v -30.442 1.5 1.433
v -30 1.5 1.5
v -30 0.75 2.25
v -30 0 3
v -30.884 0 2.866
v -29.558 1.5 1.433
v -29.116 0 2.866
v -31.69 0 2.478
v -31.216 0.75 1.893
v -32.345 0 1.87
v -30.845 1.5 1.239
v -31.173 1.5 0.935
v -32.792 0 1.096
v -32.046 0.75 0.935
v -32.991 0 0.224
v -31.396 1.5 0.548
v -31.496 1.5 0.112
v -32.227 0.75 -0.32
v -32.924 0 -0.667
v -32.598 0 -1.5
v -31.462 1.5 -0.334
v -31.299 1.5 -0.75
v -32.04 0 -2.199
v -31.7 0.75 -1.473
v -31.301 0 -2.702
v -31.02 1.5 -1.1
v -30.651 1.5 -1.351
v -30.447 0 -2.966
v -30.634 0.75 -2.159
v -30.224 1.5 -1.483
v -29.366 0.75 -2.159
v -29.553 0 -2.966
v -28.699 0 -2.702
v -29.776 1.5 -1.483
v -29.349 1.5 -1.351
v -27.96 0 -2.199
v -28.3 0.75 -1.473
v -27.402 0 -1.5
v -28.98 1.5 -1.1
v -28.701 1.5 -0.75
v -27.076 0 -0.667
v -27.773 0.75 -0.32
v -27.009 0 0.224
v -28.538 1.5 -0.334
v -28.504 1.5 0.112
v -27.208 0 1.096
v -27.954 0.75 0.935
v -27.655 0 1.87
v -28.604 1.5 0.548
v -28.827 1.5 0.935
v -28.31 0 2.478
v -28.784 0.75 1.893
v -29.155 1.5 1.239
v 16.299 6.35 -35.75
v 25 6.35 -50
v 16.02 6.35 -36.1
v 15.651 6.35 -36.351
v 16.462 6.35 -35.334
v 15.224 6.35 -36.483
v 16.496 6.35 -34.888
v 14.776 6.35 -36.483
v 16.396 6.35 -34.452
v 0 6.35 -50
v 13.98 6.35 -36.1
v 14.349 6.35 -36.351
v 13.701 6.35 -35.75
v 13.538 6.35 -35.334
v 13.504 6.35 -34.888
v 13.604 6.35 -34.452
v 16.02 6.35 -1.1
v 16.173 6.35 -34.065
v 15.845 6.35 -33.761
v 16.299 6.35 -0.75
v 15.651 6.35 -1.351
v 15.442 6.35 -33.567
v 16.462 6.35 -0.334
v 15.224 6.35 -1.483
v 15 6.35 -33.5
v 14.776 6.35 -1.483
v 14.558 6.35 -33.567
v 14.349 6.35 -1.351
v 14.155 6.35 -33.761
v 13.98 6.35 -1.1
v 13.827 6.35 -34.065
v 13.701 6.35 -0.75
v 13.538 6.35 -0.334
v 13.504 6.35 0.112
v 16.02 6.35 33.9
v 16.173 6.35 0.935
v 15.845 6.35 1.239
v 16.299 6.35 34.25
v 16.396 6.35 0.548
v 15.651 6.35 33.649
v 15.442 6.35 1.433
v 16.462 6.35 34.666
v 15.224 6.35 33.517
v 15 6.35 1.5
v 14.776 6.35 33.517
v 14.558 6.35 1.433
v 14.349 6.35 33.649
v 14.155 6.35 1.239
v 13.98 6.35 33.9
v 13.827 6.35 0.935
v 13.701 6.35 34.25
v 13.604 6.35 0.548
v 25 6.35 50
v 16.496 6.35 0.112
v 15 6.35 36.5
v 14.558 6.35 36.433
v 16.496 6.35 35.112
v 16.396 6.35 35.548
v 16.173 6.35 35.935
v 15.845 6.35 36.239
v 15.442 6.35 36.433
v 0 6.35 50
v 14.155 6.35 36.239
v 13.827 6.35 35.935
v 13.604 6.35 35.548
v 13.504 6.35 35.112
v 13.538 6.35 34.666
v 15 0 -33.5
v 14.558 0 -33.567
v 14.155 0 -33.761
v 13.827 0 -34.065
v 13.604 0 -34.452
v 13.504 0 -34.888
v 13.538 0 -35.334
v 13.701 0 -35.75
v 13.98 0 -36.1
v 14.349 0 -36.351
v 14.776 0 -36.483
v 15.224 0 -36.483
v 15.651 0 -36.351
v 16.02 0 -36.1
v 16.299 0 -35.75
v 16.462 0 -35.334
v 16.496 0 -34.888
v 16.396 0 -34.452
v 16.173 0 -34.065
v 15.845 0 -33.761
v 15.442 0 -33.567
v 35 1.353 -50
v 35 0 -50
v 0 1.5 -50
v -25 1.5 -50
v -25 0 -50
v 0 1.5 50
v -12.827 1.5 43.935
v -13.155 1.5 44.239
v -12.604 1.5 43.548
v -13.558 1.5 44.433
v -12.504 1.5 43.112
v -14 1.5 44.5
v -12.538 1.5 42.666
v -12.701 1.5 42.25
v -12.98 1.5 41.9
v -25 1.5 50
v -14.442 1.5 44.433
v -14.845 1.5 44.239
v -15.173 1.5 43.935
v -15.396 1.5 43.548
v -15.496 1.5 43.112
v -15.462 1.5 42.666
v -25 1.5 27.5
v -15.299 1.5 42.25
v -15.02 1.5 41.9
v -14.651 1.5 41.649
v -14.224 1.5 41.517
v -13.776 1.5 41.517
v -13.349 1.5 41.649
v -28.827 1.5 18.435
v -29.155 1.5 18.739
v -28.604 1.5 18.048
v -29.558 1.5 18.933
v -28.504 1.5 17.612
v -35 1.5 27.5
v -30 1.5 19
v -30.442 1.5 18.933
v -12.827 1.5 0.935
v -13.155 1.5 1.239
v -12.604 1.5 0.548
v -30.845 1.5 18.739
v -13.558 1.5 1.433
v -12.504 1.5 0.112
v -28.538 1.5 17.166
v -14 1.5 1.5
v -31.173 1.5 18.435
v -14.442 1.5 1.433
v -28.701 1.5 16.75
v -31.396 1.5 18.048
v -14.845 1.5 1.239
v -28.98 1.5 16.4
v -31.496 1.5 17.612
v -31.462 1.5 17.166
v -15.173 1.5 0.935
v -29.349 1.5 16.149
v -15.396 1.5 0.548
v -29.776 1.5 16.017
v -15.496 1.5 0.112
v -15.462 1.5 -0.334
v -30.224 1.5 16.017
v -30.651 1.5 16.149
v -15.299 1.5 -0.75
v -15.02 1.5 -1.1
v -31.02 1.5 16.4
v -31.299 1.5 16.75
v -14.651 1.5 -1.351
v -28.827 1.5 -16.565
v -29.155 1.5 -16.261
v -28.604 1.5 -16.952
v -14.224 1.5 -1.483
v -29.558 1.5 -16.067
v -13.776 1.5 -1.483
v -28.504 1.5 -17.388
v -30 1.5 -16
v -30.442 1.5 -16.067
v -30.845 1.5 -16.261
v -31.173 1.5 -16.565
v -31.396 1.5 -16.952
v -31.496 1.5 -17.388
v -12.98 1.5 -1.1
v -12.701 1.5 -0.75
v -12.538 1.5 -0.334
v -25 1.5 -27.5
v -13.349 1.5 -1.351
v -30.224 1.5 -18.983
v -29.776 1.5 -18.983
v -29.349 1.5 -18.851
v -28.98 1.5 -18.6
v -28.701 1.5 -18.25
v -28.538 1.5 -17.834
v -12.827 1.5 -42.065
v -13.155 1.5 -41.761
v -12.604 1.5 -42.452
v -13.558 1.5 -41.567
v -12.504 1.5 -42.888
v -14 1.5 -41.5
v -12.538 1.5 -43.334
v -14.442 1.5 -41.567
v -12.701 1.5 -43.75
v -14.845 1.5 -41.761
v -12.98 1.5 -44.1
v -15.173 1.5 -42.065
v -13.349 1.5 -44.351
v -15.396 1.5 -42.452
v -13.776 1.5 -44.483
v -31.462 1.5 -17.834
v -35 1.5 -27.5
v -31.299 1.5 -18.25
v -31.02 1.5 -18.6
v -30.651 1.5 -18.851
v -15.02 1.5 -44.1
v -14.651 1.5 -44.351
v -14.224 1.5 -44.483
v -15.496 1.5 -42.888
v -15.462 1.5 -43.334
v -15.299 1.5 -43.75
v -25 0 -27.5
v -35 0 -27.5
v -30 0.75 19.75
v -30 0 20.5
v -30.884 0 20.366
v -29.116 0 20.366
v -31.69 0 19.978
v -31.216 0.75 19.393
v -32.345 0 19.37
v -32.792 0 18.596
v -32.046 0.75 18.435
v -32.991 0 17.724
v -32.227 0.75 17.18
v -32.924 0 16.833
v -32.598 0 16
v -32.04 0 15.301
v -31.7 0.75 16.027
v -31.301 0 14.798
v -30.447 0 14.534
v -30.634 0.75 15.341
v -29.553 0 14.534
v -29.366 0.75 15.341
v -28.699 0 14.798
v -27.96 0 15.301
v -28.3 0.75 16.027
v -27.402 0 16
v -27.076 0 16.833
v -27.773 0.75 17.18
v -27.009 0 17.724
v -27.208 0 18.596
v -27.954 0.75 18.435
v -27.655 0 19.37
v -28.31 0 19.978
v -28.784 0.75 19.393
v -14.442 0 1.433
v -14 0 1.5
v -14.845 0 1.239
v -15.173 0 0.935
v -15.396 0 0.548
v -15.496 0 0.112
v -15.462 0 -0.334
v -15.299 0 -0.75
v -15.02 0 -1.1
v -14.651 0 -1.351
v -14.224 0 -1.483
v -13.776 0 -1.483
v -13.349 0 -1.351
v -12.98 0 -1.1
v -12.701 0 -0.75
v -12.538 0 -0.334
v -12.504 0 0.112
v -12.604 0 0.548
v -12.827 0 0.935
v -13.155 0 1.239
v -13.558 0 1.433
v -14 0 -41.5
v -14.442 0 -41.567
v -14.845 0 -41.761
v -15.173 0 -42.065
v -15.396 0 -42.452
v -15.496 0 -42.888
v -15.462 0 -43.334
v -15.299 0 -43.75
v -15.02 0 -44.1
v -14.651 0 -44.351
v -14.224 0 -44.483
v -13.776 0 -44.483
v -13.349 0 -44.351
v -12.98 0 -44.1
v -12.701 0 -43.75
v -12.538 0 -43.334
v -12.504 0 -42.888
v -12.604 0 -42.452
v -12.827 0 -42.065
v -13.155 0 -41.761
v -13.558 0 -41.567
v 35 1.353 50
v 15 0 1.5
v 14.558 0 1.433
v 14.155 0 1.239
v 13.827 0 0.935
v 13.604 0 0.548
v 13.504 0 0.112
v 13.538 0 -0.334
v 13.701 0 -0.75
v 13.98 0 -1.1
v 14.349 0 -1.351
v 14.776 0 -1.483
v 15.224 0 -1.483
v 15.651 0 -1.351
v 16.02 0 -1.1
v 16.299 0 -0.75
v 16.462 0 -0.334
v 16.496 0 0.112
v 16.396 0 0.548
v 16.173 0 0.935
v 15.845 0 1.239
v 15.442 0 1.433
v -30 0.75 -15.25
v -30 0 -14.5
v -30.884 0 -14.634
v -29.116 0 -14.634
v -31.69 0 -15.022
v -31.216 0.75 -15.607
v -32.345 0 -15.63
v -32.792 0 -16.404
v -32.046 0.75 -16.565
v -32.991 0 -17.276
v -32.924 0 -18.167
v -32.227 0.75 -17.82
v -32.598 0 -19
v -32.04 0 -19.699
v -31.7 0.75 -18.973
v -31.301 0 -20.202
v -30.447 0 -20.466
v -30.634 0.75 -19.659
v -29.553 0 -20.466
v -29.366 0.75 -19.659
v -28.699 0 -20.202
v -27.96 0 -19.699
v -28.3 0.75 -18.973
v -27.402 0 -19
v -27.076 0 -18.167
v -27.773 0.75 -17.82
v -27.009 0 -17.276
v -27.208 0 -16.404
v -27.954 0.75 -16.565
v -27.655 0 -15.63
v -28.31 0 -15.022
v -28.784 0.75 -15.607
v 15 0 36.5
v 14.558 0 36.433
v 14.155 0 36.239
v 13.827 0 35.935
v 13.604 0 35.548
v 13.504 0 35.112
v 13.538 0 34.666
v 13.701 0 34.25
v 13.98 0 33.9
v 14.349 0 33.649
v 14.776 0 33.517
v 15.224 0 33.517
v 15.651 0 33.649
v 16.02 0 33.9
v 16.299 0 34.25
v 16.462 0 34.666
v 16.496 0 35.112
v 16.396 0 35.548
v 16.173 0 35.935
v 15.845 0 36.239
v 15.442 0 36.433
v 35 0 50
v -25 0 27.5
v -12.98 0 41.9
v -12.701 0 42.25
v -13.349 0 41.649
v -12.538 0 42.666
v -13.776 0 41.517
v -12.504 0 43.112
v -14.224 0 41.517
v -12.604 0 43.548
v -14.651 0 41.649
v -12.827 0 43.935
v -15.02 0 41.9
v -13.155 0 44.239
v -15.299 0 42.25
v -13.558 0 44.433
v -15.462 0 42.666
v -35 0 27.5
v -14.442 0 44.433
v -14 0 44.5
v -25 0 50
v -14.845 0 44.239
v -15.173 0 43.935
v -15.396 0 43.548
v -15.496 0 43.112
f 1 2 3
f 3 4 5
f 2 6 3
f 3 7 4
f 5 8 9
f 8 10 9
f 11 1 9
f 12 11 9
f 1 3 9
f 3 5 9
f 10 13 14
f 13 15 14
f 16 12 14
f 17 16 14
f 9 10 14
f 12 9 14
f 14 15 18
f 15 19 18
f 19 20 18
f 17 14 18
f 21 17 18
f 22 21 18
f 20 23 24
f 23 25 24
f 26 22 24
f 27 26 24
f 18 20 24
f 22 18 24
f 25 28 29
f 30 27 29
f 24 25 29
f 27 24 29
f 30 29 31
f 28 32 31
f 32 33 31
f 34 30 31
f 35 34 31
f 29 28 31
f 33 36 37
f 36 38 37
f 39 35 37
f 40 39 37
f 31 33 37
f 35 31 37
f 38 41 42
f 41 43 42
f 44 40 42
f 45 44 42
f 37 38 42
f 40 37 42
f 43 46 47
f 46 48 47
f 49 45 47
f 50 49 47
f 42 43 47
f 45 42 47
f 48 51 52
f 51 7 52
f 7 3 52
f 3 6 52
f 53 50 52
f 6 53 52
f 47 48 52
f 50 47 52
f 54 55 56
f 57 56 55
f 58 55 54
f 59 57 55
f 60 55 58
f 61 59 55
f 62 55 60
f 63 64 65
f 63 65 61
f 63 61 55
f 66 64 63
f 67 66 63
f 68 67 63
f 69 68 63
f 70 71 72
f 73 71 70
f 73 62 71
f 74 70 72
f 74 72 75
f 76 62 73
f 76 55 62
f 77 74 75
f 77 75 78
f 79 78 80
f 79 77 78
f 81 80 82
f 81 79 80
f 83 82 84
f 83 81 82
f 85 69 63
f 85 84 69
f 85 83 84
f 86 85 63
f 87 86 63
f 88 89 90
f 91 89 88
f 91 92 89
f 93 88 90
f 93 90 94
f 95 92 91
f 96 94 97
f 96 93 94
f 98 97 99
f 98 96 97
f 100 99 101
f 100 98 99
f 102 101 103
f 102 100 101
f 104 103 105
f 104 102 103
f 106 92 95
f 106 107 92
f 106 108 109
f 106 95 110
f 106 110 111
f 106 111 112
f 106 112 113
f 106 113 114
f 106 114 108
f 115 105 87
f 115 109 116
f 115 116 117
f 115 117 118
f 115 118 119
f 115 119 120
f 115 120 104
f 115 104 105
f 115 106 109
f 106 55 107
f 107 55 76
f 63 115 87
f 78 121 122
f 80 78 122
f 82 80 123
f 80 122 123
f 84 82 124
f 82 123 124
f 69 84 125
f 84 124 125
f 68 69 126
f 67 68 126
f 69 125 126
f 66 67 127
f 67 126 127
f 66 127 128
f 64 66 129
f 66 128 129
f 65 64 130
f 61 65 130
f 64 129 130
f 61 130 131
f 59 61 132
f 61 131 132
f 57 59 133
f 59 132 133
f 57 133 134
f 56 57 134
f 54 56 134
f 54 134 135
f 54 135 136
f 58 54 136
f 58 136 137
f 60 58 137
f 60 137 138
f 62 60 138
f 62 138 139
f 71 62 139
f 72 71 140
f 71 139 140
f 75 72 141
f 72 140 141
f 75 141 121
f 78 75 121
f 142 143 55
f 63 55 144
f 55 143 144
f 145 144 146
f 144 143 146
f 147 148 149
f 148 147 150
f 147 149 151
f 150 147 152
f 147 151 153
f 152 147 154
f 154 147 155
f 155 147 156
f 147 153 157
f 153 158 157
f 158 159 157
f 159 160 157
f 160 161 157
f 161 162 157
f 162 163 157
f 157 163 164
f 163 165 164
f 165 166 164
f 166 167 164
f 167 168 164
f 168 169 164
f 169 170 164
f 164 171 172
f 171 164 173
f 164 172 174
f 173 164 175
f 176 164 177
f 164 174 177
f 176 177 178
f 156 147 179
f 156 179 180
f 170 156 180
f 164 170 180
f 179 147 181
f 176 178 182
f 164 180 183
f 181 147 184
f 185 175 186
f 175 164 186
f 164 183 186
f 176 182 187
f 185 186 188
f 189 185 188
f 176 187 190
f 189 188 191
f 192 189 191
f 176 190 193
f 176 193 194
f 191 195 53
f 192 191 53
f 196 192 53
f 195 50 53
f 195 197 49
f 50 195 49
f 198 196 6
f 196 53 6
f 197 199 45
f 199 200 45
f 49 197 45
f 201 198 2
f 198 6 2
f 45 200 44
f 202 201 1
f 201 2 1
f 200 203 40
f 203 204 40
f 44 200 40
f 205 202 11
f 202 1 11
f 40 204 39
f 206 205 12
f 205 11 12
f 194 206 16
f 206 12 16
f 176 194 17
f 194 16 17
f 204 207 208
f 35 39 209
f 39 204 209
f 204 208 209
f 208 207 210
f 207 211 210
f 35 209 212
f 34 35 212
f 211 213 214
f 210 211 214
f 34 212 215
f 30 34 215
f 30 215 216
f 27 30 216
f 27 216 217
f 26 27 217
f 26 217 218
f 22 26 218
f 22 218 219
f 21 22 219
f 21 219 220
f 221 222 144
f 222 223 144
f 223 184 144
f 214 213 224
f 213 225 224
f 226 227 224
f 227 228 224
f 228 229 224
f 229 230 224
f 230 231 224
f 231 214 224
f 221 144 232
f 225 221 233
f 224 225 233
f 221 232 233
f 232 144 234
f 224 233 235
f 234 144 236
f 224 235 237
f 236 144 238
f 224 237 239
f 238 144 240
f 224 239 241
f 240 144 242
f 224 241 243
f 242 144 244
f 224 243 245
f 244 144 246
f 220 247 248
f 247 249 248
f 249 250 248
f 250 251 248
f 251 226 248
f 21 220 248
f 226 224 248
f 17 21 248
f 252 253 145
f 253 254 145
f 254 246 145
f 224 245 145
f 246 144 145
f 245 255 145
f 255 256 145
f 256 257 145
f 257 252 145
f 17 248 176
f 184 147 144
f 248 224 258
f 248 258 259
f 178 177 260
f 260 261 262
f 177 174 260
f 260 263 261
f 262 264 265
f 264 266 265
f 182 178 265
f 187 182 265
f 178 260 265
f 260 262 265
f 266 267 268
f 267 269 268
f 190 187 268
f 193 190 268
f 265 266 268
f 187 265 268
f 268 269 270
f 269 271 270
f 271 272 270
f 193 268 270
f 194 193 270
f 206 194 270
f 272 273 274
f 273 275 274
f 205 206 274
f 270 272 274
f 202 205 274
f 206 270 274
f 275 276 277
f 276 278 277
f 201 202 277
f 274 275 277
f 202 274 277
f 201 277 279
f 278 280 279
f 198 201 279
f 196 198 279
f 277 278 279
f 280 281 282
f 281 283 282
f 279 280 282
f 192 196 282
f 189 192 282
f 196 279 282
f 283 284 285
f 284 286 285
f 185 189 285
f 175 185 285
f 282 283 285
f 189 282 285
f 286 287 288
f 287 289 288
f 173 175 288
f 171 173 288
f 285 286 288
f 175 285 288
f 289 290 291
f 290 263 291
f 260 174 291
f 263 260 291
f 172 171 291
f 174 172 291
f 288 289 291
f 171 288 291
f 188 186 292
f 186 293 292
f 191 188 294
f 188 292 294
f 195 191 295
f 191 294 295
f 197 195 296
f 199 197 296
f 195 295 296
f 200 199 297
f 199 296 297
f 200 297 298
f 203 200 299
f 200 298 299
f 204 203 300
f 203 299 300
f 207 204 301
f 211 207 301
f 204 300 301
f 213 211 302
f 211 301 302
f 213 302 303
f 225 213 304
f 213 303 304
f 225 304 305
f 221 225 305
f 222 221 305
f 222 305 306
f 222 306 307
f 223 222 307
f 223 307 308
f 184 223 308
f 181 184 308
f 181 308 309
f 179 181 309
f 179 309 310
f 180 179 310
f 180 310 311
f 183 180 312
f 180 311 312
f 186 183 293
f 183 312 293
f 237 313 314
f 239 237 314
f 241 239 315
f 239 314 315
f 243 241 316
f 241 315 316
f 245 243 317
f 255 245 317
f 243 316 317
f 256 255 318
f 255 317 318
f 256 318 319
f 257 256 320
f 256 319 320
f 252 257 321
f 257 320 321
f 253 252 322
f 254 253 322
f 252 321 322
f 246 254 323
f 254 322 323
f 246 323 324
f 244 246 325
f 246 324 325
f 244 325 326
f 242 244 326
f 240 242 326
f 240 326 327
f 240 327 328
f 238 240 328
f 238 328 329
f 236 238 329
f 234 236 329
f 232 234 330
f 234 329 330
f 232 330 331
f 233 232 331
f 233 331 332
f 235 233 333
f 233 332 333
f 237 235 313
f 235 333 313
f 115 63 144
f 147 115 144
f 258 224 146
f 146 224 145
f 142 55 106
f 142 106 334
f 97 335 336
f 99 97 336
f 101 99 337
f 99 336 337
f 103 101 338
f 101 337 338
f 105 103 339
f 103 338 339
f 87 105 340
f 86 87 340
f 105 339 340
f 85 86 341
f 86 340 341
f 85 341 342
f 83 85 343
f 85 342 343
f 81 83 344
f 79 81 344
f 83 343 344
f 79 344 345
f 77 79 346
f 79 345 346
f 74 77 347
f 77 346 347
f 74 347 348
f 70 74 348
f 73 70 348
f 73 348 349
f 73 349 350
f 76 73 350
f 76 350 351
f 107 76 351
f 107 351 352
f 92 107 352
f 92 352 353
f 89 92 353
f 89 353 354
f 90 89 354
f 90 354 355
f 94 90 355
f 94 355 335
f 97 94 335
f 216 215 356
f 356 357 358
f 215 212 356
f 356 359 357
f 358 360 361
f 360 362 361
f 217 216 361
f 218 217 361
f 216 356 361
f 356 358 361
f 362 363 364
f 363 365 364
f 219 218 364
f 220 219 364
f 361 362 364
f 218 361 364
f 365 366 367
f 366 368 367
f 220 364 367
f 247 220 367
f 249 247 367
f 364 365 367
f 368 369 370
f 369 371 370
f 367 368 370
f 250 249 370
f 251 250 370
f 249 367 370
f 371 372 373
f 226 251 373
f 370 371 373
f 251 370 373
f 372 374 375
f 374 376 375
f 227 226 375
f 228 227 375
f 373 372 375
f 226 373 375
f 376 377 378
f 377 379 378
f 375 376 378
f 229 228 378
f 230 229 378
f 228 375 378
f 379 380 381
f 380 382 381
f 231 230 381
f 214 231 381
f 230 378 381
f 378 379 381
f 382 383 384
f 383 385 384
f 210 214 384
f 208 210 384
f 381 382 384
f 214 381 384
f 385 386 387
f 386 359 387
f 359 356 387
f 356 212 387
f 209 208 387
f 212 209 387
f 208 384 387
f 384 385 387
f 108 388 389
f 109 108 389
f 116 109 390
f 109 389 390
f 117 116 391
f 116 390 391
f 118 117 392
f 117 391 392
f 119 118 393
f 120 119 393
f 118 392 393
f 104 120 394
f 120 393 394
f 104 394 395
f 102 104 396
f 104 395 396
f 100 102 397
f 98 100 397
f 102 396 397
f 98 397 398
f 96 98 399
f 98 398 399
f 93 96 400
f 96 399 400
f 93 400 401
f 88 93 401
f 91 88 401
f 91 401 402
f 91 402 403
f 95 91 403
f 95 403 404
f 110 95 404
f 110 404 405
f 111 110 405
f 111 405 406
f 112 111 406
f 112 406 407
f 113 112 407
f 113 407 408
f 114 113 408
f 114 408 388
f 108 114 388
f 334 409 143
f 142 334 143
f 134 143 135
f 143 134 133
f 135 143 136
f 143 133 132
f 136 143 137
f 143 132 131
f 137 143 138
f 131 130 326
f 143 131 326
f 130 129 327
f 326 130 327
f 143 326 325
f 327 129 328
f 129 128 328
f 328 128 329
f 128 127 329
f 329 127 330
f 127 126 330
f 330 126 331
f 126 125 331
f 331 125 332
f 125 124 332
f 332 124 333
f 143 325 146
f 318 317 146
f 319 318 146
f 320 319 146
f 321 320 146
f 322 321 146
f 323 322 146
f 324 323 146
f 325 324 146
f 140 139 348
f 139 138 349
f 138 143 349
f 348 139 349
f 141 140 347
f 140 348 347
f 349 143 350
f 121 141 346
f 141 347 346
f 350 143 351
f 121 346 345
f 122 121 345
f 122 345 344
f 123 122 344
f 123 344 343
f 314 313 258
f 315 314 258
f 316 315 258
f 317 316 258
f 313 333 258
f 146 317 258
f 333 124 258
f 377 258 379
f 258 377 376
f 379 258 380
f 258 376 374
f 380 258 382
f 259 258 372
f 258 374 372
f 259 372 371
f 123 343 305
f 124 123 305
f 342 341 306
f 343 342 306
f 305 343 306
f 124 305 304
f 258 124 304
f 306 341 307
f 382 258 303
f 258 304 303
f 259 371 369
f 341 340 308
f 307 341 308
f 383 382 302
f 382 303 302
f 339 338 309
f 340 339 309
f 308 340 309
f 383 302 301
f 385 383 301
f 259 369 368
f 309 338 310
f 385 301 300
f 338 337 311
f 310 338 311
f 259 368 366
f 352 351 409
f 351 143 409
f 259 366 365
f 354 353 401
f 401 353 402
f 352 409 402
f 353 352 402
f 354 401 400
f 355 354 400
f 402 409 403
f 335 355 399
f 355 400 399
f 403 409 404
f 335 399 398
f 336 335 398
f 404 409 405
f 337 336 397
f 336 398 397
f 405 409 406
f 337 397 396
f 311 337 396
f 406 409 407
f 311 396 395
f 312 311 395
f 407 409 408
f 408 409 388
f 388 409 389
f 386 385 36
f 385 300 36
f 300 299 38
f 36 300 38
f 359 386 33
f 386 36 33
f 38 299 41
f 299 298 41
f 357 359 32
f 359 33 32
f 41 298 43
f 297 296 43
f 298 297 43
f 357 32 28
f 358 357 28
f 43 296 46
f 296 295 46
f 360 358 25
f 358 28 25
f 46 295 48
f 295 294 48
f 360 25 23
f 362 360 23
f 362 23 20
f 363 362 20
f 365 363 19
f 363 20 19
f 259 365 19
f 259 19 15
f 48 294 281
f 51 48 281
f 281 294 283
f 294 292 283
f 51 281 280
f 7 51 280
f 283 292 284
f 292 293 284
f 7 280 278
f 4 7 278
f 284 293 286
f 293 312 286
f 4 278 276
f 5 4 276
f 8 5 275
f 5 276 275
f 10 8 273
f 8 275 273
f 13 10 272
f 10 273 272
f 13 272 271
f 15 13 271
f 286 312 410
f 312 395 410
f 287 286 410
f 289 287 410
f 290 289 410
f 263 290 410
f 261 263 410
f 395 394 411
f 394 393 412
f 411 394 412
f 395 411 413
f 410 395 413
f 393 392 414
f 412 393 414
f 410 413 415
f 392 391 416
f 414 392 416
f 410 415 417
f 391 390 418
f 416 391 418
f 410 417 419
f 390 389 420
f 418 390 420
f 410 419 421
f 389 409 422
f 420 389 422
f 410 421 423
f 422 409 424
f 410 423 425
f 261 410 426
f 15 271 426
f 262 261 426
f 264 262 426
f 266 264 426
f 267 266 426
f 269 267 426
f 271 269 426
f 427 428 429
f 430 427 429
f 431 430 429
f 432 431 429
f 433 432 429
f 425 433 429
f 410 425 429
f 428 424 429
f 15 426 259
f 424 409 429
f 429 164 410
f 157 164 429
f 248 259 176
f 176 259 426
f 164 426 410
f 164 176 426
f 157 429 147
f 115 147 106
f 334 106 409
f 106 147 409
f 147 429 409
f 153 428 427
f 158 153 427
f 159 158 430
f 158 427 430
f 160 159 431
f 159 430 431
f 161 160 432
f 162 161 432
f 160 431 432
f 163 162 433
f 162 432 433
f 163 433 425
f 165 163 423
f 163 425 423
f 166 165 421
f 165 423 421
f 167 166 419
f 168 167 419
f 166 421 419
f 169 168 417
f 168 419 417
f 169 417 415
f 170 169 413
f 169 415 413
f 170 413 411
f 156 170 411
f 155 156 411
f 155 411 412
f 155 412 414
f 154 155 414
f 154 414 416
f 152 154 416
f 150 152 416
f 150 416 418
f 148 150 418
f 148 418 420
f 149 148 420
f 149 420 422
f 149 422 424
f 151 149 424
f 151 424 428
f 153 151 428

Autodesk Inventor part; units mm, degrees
ref_plane "YZ Plane" through (0, 0, 0) normal (1, 0, 0) x (0, 1, 0)
ref_plane "XZ Plane" through (0, 0, 0) normal (0, 1, 0) x (-1, 0, 0)
ref_plane "XY Plane" through (0, 0, 0) normal (0, 0, 1) x (1, 0, 0)
sketch "Esboço1" plane through (0, 0, 0) normal (0, 1, 0) x (-1, 0, 0)
  line L0 (-35, -50) -> (35, -50)
  line L1 (35, -50) -> (35, 50)
  line L2 (35, 50) -> (-35, 50)
  line L3 (-35, 50) -> (-35, -50)
  line L4 (-35, -50) -> (35, 50) construction
  line L5 (35, -50) -> (-35, 50) construction
  point P0 (0, 0)
  dimension "d0" = 70
  dimension "d1" = 100
extrude "Extrusão1" add sketch "Esboço1" along normal blind 6.35
sketch "Esboço2" plane through (35, 0, -50) normal (0, 0, -1) x (-1, 0, 0)
  line L0 (10, 6.35) -> (0, 1.3533)
  line L1 (0, 1.3533) -> (37.5, 1.3533) construction
  line L2 (0, 0) -> (0, 6.35) projected
  line L3 (0, 6.35) -> (70, 6.35) projected
  line L4 (0, 0) -> (70, 0) projected
  line L5 (70, 0) -> (70, 6.35) projected
  line L6 (0, 6.35) -> (70, 6.35) projected
  line L7 (0, 0) -> (0, 6.35) projected
  line L8 (10, 6.35) -> (35, 6.35)
  line L9 (70, 6.35) -> (0, 6.35) projected
  line L10 (35, 6.35) -> (35, 1.5)
  line L11 (35, 1.5) -> (70, 1.5)
  line L12 (70, 0) -> (70, 6.35) projected
  point P0 (35, 0)
  point P1 (70, 1.5)
  point P2 (35, 6.35)
  dimension "d7" = 25
  dimension "d8" = 26.55
  dimension "d9" = 1.5
  dimension "d16" = 35
extrude "Extrusão2" cut sketch "Esboço2" against normal through all contours L0 L2 L3 | L3 L5 L11 L10
sketch "Esboço3" plane through (-35, 1.5, -50) normal (0, 1, 0) x (1, 0, 0)
  line L0 (0, -77.5) -> (10, -77.5)
  line L1 (10, -77.5) -> (10, -22.5)
  line L2 (10, -22.5) -> (0, -22.5)
  line L3 (0, -22.5) -> (0, -77.5)
  line L4 (0, -77.5) -> (10, -22.5) construction
  line L5 (10, -77.5) -> (0, -22.5) construction
  line L6 (0, -100) -> (0, 0) projected
  line L7 (35, -100) -> (0, -100) projected
  line L8 (35, 0) -> (35, -100) projected
  line L9 (0, 0) -> (35, 0) projected
  line L10 (0, -100) -> (0, 0) projected
  line L11 (10, -77.5) -> (10, -100)
  line L12 (0, -100) -> (70, -100) projected
  line L13 (10, -22.5) -> (10, 0)
  line L14 (70, 0) -> (0, 0) projected
  point P0 (35, -50)
  point P1 (5, -50)
  point P2 (5, -50)
  point P3 (10, -100)
  dimension "d12" = 10
  dimension "d13" = 55
extrude "Extrusão3" cut sketch "Esboço3" against normal through all contours L0 L11 L7 L6 | L6 L9 L13 L2
sketch "Esboço10" plane through (0, 1.5, 50) normal (0, 1, 0) x (1, 0, 0)
  line L0 (-35, 22.5) -> (-25, 22.5) projected
  line L1 (-25, 77.5) -> (-35, 77.5) projected
  line L2 (0, 0) -> (-25, 0) projected
  line L3 (-25, 22.5) -> (-25, 0) projected
  point P0 (0, 50)
  point P1 (-30, 32.5)
  point P2 (-30, 50)
  point P3 (-30, 67.5)
  dimension "d61" = 10
  dimension "d62" = 10
  dimension "d63" = 50
  dimension "d64" = 5
hole "Furo3" at (-30, 1.5, 17.5) at (-30, 1.5, 0) at (-30, 1.5, -17.5) direction (0, -1, 0) diameter 3 end through all
chamfer "Chanfro1" distance 1.5 angle 45 3 edges at (-30, 0, -19) (-30, 0, -1.5) (-30, 0, 16)
sketch "Esboço11" plane through (0, 6.35, 0) normal (0, 1, 0) x (1, 0, 0)
  line L0 (0, 50) -> (0, -50) projected
  line L1 (25, -50) -> (25, 50) projected
  point P0 (0, 0)
  point P1 (15, -35)
  point P2 (15, 0)
  point P3 (15, 35)
  point P4 (0, 0)
  point P5 (-14, 0)
  point P6 (-14, -43)
  point P7 (-14, 43)
  dimension "d75" = 10
  dimension "d76" = 35
  dimension "d77" = 35
  dimension "d78" = 29
  dimension "d79" = 43
  dimension "d80" = 43
hole "Furo4" at (15, 6.35, 35) at (15, 6.35, 0) at (15, 6.35, -35) at (-14, 6.35, 0) at (-14, 6.35, 43) at (-14, 6.35, -43) direction (0, -1, 0) diameter 3 end through all
equation "\"d62\" = d61"
equation "\"d77\" = d76"
equation "\"d80\" = d79"
properties part number "Base Aço" material "Aço"
